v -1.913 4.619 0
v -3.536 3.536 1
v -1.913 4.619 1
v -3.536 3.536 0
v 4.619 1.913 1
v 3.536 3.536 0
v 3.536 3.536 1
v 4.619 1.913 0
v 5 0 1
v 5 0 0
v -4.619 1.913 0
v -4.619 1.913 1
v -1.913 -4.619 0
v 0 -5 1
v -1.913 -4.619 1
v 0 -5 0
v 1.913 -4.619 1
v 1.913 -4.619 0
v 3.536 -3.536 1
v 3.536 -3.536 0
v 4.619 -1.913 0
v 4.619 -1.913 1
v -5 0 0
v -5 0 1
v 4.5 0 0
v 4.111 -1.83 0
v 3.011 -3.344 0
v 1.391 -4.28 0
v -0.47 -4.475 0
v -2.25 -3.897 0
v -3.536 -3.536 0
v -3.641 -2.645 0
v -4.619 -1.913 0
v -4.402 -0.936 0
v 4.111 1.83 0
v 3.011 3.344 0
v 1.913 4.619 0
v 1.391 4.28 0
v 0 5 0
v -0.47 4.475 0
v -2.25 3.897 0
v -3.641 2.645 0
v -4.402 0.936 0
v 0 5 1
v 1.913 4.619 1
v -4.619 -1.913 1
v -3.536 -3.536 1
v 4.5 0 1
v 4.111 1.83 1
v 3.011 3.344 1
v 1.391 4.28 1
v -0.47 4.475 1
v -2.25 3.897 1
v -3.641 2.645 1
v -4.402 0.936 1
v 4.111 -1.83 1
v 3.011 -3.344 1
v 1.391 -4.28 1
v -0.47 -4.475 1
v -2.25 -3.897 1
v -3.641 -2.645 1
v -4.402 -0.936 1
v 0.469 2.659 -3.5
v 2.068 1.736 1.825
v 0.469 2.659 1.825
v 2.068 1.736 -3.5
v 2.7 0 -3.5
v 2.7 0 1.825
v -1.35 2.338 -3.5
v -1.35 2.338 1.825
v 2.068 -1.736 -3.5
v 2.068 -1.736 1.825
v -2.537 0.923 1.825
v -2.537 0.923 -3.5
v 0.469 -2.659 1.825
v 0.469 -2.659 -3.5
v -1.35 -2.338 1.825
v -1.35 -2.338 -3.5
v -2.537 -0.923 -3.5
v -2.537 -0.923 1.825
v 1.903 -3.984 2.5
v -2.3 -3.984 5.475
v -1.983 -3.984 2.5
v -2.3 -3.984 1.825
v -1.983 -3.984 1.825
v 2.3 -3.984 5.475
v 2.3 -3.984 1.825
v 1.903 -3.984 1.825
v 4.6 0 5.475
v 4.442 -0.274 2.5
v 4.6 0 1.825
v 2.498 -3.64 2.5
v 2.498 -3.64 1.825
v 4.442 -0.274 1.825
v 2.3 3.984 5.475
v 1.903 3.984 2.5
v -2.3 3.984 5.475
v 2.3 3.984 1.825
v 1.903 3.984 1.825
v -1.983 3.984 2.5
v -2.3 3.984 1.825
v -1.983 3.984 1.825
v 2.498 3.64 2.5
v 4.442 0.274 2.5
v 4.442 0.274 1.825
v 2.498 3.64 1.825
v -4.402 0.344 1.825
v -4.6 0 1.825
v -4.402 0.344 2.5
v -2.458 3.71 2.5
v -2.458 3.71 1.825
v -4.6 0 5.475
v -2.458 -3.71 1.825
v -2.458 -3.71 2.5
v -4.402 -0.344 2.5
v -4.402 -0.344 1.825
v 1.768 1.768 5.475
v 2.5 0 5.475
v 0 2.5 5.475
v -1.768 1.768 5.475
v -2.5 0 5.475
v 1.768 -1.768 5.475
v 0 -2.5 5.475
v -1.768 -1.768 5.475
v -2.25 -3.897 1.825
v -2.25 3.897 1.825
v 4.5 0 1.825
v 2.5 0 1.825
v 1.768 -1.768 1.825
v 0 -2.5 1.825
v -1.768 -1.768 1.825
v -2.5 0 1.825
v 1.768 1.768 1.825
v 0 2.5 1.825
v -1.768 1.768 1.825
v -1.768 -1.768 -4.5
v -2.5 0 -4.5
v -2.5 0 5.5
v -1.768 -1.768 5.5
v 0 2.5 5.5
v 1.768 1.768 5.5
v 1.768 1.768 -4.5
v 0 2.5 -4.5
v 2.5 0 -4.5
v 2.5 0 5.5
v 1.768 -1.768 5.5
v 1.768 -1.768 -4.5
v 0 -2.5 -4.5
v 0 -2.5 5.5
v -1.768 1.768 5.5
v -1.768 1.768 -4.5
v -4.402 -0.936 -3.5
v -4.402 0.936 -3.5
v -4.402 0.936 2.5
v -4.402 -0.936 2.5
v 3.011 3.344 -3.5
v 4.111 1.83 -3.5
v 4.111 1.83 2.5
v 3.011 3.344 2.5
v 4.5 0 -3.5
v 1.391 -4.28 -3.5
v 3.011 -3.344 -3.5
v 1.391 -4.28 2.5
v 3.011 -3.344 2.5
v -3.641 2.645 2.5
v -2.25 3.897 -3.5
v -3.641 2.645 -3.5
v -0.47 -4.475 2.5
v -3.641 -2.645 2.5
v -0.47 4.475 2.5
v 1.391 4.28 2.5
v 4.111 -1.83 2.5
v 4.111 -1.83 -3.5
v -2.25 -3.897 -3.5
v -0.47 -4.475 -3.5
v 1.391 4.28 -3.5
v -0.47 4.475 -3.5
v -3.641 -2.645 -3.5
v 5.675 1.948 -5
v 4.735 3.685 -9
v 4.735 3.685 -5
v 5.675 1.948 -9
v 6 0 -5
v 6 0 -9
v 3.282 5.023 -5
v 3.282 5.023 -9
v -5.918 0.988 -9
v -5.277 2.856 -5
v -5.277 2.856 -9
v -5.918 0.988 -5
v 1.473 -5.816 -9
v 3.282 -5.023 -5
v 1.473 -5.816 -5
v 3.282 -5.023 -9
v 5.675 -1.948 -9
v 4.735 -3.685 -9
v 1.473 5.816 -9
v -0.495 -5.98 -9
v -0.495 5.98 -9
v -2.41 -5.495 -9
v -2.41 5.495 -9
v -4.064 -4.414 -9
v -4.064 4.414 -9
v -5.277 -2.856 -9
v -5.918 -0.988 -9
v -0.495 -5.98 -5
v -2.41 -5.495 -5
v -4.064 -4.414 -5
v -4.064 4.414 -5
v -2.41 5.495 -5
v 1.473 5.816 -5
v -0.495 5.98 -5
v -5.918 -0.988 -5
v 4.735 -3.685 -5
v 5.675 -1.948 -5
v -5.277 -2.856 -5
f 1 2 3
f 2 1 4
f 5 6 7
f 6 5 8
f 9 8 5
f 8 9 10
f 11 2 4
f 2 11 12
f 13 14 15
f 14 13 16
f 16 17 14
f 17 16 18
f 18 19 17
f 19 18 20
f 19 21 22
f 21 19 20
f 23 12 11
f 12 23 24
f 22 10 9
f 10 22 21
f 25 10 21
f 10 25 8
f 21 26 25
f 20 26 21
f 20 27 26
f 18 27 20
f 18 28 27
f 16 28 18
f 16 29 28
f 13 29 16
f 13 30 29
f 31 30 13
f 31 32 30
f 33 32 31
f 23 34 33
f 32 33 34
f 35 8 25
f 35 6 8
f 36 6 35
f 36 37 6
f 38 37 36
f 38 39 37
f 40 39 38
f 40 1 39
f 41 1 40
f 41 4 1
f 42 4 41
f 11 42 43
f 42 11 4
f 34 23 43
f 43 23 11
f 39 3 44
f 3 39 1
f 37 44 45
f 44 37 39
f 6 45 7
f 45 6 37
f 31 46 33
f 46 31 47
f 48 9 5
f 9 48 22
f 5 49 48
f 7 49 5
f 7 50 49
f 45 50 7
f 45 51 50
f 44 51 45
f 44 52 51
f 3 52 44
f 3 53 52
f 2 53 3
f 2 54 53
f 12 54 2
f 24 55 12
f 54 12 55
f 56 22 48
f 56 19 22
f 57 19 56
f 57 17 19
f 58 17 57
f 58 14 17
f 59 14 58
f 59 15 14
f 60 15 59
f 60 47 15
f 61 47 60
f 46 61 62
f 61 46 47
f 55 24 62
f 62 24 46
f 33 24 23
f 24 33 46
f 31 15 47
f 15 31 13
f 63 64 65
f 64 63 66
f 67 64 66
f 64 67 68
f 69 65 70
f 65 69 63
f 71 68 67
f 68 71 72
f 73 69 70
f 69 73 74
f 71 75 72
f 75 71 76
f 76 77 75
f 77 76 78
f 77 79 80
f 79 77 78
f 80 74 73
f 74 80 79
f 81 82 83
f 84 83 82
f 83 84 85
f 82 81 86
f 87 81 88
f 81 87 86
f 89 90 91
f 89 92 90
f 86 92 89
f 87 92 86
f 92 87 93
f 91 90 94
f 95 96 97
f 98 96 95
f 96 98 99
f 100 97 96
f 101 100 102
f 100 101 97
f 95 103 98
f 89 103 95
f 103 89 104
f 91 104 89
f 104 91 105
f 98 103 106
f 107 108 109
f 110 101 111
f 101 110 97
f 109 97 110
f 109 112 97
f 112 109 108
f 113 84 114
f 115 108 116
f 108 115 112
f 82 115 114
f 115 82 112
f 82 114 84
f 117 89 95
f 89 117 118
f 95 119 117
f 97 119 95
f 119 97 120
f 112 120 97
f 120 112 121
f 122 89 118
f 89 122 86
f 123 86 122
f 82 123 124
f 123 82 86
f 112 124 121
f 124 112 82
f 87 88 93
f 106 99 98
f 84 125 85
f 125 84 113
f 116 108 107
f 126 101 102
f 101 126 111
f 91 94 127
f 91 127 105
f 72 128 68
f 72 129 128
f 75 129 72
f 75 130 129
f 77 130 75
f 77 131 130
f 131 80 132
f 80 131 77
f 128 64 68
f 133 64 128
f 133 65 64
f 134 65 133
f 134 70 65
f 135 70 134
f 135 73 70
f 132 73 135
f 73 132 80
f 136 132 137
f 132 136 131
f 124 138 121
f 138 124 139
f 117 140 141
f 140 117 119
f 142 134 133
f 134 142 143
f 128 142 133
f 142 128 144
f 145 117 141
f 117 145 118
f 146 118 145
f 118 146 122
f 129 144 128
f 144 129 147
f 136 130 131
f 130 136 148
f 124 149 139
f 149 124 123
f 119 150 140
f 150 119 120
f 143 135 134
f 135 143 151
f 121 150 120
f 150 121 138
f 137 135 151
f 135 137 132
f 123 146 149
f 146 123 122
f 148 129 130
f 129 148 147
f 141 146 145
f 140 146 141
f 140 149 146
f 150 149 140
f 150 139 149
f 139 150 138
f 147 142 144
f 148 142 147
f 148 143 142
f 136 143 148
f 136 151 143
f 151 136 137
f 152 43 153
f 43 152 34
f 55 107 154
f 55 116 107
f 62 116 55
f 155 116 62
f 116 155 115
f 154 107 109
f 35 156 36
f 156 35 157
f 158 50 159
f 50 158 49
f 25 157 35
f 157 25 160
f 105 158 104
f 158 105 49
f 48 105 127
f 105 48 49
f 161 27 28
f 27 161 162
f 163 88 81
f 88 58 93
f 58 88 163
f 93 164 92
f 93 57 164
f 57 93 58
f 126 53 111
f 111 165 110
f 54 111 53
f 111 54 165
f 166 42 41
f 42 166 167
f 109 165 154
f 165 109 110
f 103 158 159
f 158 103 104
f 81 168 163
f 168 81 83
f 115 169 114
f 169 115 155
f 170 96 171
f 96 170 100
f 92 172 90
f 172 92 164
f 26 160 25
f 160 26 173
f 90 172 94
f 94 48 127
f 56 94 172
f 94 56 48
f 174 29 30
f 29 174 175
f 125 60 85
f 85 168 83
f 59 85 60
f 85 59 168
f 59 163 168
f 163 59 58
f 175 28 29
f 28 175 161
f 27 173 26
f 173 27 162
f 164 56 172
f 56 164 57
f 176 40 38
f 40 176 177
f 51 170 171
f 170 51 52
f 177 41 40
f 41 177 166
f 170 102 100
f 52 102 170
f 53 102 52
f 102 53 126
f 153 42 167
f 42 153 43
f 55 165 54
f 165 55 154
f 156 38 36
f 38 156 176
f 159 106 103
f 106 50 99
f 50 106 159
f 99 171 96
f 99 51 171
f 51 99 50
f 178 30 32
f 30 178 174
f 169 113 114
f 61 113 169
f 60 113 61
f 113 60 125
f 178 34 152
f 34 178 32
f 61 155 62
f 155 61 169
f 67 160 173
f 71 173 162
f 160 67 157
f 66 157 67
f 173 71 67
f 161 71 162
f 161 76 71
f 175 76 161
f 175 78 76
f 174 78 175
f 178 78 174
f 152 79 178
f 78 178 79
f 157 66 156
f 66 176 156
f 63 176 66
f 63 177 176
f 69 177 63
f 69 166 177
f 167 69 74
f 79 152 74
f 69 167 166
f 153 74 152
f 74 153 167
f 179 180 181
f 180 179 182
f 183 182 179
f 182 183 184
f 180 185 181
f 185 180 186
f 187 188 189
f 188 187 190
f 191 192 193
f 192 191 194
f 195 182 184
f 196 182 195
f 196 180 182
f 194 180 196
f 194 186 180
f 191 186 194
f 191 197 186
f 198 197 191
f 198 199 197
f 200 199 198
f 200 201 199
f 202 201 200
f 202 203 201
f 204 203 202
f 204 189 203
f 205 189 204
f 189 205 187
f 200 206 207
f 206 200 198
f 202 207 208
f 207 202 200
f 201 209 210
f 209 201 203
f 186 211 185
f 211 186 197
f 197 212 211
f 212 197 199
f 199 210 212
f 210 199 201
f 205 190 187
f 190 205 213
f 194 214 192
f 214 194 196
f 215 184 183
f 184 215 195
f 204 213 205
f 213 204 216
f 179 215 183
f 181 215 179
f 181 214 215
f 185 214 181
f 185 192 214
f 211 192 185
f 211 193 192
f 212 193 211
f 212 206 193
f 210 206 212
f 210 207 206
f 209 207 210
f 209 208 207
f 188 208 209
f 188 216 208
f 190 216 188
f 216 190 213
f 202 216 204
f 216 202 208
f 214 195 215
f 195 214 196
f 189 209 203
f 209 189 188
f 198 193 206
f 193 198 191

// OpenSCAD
// Parameters
shaft_diameter = 5; //[2.5:10:0.1]
shaft_length = 10; //[5:20:0.5]
head_diameter_across_corners = 9.2; //[4.6:18.4:0.1]
head_height = 3.65; //[1.8:7.3:0.05]
overlap = 1; //[0.5:2:0.1]
tip_length = 1.5; //[0.5:3:0.1]
tip_radius_factor = 0.15; //[0.05:0.4:0.01]
washer_outer_diameter = 10; //[6:20:0.1]
washer_thickness = 1; //[0.5:2:0.1]
washer_clearance = 0.4; //[0.2:1:0.05]
spacer_height = 6; //[3:12:0.5]
spacer_wall = 1.8; //[0.9:3.6:0.1]
buzzer_radius = 6; //[3:12:0.5]
buzzer_height = 4; //[2:8:0.5]

// Screw and Washer - complete geometry
module screw_and_washer() {
  color("DimGray") {
    // Hex Head
    translate([0, 0, head_height/2])
      cylinder(h=head_height, r=head_diameter_across_corners/2, $fn=6);
    
    // Threaded Shaft
    translate([0, 0, -shaft_length/2 + overlap/2])
      cylinder(h=shaft_length, r=shaft_diameter/2);
    
    // Tip End
    translate([0, 0, -shaft_length + tip_length/2 + overlap/2])
      cylinder(h=tip_length, r1=shaft_diameter/2, r2=shaft_diameter/2 * tip_radius_factor);
    
    // Washer
    difference() {
      translate([0, 0, washer_thickness/2 - overlap/2])
        cylinder(h=washer_thickness, r=washer_outer_diameter/2);
      translate([0, 0, washer_thickness/2 - overlap/2])
        cylinder(h=washer_thickness + 2*overlap, r=(shaft_diameter + washer_clearance)/2);
    }
  }
}

// PCB Spacer - complete geometry
module pcb_spacer() {
  color("Silver") {
    difference() {
      translate([0, 0, -spacer_height/2 - overlap/2])
        cylinder(h=spacer_height, r=(shaft_diameter + washer_clearance)/2 + spacer_wall);
      translate([0, 0, -spacer_height/2 - overlap/2])
        cylinder(h=spacer_height + 2*overlap, r=(shaft_diameter + washer_clearance)/2);
    }
  }
}

// Buzzer - complete geometry
module buzzer() {
  color("Black") {
    translate([0, 0, -spacer_height - buzzer_height/2 - overlap])
      cylinder(h=buzzer_height, r=buzzer_radius);
  }
}

// Assembly
module assembly() {
  screw_and_washer();
  pcb_spacer();
  buzzer();
}

assembly();
